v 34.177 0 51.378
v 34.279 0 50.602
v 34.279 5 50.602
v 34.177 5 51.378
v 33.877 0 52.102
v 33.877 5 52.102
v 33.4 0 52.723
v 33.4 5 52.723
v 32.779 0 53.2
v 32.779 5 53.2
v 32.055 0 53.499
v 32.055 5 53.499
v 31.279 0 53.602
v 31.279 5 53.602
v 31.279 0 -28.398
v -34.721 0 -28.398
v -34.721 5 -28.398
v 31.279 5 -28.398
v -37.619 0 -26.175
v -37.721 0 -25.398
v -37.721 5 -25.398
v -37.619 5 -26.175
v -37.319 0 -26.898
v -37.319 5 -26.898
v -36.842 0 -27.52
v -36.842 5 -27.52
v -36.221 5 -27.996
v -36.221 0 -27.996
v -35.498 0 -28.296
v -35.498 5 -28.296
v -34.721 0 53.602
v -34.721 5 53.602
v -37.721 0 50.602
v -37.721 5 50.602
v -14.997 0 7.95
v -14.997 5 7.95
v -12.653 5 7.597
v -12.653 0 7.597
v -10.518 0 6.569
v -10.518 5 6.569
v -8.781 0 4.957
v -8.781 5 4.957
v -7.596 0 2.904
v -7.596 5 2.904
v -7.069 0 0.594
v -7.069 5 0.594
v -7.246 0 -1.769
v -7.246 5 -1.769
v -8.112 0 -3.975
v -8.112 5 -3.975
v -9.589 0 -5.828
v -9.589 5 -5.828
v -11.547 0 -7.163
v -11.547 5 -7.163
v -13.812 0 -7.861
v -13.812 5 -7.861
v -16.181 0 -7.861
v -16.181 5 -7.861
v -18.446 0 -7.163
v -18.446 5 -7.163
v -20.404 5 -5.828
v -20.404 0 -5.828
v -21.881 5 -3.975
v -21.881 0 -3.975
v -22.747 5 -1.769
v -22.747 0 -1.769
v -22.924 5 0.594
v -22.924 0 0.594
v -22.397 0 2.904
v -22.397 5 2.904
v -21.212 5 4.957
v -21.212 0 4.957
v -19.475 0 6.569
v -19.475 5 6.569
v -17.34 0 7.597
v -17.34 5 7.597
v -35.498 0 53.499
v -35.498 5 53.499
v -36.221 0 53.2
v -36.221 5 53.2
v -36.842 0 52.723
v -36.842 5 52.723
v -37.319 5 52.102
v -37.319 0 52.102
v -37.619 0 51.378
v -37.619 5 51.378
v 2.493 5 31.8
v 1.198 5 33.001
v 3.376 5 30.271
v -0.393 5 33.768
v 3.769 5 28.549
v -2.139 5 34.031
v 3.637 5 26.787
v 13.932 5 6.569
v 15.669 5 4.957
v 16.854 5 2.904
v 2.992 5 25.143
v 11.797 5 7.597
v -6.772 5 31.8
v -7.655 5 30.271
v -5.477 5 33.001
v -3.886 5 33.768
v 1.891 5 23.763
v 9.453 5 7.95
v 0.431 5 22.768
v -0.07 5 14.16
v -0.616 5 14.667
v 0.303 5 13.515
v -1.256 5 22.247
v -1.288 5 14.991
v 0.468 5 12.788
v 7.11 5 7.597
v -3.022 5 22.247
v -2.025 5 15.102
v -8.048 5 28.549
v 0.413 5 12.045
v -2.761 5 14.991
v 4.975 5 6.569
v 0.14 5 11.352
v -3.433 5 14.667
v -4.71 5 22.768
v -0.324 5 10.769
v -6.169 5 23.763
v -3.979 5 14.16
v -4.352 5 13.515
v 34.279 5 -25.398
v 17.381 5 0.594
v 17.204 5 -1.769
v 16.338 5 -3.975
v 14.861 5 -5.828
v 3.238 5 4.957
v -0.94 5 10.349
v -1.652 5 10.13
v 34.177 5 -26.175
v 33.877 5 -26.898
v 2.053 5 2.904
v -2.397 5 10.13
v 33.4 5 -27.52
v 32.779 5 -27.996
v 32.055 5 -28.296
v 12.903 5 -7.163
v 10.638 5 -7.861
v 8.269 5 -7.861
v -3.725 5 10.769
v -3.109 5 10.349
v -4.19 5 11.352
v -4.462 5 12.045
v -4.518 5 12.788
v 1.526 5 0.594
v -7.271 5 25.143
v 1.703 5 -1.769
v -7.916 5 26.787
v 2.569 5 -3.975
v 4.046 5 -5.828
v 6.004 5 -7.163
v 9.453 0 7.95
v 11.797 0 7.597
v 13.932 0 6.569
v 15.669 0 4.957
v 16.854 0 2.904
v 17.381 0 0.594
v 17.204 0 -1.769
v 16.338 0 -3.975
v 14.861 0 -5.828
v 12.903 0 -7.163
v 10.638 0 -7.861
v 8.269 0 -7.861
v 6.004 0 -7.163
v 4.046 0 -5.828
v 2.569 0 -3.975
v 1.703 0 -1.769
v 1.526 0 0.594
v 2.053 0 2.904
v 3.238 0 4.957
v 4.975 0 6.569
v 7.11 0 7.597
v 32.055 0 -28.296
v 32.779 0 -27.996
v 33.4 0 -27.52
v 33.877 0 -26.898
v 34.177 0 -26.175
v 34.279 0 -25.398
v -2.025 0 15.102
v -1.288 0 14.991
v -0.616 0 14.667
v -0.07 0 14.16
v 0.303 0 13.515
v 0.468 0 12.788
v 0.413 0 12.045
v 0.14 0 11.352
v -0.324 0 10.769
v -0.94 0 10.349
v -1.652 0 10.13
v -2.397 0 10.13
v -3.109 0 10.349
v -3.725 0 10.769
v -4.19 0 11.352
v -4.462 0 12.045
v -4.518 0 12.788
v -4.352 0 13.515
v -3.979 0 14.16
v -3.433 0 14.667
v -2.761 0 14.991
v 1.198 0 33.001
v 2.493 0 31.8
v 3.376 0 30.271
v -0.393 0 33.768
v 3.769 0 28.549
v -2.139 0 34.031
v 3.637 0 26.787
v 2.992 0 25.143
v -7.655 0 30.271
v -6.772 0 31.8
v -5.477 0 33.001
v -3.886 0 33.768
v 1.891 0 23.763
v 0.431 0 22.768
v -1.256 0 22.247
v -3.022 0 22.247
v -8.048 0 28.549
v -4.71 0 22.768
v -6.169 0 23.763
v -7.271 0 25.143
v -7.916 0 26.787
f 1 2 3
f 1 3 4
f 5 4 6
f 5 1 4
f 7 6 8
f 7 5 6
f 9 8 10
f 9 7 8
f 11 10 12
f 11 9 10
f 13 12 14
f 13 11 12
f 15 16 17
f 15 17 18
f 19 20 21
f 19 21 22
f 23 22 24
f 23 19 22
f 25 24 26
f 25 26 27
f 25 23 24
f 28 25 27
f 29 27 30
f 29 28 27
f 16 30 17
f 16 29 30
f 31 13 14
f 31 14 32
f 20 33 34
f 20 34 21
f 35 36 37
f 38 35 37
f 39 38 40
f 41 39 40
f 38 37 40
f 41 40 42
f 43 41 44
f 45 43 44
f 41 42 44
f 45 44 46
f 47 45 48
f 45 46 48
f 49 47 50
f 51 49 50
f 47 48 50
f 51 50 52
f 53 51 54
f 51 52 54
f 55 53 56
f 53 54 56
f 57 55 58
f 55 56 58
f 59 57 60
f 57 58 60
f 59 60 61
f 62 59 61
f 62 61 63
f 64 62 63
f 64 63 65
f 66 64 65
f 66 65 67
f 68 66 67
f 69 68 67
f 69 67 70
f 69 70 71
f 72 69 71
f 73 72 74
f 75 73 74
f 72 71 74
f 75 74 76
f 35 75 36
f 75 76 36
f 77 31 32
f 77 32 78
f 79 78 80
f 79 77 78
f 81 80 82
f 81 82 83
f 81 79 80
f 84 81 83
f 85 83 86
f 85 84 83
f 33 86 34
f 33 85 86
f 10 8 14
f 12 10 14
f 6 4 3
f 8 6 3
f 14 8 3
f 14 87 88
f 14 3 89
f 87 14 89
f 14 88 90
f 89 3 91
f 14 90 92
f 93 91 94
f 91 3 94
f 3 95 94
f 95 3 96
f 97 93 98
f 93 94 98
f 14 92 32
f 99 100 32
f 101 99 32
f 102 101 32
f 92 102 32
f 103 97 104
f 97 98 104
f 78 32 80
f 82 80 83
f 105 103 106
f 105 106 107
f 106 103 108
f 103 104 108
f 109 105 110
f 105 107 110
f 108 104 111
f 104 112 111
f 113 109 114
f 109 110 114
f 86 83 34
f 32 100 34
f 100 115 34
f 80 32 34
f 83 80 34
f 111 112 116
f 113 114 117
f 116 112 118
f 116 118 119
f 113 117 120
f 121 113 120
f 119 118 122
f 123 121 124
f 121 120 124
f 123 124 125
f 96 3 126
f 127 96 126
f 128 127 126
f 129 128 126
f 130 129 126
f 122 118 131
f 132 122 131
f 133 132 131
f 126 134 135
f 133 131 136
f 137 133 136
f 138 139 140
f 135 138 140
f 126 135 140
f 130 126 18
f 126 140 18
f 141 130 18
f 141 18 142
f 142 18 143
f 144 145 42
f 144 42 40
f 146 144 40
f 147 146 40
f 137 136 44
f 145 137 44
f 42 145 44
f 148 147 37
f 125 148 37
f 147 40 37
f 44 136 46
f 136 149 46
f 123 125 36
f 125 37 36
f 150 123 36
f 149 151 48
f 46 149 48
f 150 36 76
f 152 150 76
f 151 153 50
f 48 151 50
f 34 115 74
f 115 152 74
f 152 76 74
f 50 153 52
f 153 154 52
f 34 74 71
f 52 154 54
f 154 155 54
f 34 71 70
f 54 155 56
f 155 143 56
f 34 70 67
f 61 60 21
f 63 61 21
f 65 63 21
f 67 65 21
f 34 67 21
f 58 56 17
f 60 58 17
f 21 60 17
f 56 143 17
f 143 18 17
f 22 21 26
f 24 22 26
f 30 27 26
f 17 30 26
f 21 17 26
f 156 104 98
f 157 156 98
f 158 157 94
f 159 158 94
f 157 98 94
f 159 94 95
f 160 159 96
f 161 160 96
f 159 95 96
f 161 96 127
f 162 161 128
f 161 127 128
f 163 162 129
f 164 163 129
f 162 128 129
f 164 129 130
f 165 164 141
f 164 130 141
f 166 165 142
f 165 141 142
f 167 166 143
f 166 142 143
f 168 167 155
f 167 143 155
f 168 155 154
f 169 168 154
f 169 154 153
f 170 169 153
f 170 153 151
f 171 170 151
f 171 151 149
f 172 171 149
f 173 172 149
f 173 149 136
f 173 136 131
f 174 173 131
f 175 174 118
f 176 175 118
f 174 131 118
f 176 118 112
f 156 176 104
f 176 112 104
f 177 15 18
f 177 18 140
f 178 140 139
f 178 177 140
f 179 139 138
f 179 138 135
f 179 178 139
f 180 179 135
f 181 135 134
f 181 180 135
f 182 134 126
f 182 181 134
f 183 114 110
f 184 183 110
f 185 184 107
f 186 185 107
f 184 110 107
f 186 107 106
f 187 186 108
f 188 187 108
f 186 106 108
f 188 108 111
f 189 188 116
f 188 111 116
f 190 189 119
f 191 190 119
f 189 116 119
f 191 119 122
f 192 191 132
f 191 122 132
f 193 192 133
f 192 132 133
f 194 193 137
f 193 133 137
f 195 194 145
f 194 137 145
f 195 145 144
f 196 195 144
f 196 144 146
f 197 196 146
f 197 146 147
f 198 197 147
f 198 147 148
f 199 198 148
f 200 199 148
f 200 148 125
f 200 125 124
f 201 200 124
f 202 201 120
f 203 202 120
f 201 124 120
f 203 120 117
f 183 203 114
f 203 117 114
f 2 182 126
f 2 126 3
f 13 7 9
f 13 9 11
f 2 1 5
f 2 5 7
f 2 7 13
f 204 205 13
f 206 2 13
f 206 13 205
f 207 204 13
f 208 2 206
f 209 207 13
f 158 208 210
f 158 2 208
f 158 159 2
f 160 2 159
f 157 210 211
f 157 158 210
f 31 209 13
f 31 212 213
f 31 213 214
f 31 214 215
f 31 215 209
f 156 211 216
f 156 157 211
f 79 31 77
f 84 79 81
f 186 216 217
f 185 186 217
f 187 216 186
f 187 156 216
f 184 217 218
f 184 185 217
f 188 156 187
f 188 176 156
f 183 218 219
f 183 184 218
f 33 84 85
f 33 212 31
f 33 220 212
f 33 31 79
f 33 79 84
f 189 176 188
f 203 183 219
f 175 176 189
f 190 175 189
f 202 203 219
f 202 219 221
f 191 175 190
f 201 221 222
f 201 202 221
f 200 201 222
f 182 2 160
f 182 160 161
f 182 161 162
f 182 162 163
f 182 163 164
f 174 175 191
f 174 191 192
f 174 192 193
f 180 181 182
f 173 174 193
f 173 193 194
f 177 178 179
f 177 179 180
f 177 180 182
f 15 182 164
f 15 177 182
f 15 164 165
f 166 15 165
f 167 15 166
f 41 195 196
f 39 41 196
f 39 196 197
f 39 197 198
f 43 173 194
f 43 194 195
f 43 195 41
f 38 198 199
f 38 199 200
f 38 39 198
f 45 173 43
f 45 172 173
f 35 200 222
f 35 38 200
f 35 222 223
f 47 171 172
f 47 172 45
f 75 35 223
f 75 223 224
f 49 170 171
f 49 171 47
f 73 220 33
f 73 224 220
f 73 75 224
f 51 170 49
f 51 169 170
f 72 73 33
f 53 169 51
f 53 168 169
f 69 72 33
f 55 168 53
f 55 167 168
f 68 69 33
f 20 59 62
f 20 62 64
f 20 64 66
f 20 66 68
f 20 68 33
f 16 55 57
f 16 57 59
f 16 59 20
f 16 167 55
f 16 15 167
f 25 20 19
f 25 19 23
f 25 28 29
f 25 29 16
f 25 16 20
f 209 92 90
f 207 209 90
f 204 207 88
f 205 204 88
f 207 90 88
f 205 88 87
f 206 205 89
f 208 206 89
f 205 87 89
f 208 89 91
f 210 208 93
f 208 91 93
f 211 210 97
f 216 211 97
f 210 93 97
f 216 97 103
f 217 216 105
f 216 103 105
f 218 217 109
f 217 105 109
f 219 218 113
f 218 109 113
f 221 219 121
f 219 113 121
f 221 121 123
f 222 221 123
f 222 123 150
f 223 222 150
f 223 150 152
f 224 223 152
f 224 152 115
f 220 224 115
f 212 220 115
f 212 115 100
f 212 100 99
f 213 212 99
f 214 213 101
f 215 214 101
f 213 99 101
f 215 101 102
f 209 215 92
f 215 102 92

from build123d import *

# Parameters (mm, degrees)
BOSS_EXTRUDE1_DEPTH = 5
SKETCH2_R           = 7.95
CUT_EXTRUDE3_DEPTH  = 5
SKETCH4_R           = 2.5
SKETCH4_R_2         = 5.925
CUT_EXTRUDE4_DEPTH  = 5


with BuildPart() as part:
    # Sketch1 → Boss-Extrude1 (new body)
    with BuildSketch(Plane(origin=(0, 0, 0), x_dir=(1, 0, 0), z_dir=(0, 1, 0))):
        with BuildLine():
            Line((-34.721115538, 28.398406375), (31.278884462, 28.398406375))
            ThreePointArc((31.278884462, 28.398406375), (33.400204806, 27.519726718), (34.278884462, 25.398406375))
            Line((34.278884462, 25.398406375), (34.278884462, -50.601593625))
            ThreePointArc((34.278884462, -50.601593625), (33.400204806, -52.722913969), (31.278884462, -53.601593625))
            Line((31.278884462, -53.601593625), (-34.721115538, -53.601593625))
            ThreePointArc((-34.721115538, -53.601593625), (-36.842435881, -52.722913969), (-37.721115538, -50.601593625))
            Line((-37.721115538, -50.601593625), (-37.721115538, 25.398406375))
            ThreePointArc((-37.721115538, 25.398406375), (-36.842435881, 27.519726718), (-34.721115538, 28.398406375))
        make_face()
    extrude(amount=BOSS_EXTRUDE1_DEPTH)

    # Sketch2 → Cut-Extrude3 (cut)
    with BuildSketch(Plane(origin=(0, 5, 0), x_dir=(1, 0, 0), z_dir=(0, 1, 0))):
        with Locations(Location((-14.996537264, 0, 0), (0, 0, 270))):
            Circle(SKETCH2_R)
        with Locations(Location((9.453462736, 0, 0), (0, 0, 270))):
            Circle(SKETCH2_R)
    extrude(amount=-CUT_EXTRUDE3_DEPTH, mode=Mode.SUBTRACT)

    # Sketch4 → Cut-Extrude4 (cut)
    with BuildSketch(Plane(origin=(0, 5, 0), x_dir=(1, 0, 0), z_dir=(0, 1, 0))):
        with Locations(Location((-2.024594695, -12.601593625, 0), (0, 0, 270))):
            Circle(SKETCH4_R)
        with Locations(Location((-2.139356247, -28.105866385, 0), (0, 0, 270))):
            Circle(SKETCH4_R_2)
    extrude(amount=-CUT_EXTRUDE4_DEPTH, mode=Mode.SUBTRACT)


solid = part.part
